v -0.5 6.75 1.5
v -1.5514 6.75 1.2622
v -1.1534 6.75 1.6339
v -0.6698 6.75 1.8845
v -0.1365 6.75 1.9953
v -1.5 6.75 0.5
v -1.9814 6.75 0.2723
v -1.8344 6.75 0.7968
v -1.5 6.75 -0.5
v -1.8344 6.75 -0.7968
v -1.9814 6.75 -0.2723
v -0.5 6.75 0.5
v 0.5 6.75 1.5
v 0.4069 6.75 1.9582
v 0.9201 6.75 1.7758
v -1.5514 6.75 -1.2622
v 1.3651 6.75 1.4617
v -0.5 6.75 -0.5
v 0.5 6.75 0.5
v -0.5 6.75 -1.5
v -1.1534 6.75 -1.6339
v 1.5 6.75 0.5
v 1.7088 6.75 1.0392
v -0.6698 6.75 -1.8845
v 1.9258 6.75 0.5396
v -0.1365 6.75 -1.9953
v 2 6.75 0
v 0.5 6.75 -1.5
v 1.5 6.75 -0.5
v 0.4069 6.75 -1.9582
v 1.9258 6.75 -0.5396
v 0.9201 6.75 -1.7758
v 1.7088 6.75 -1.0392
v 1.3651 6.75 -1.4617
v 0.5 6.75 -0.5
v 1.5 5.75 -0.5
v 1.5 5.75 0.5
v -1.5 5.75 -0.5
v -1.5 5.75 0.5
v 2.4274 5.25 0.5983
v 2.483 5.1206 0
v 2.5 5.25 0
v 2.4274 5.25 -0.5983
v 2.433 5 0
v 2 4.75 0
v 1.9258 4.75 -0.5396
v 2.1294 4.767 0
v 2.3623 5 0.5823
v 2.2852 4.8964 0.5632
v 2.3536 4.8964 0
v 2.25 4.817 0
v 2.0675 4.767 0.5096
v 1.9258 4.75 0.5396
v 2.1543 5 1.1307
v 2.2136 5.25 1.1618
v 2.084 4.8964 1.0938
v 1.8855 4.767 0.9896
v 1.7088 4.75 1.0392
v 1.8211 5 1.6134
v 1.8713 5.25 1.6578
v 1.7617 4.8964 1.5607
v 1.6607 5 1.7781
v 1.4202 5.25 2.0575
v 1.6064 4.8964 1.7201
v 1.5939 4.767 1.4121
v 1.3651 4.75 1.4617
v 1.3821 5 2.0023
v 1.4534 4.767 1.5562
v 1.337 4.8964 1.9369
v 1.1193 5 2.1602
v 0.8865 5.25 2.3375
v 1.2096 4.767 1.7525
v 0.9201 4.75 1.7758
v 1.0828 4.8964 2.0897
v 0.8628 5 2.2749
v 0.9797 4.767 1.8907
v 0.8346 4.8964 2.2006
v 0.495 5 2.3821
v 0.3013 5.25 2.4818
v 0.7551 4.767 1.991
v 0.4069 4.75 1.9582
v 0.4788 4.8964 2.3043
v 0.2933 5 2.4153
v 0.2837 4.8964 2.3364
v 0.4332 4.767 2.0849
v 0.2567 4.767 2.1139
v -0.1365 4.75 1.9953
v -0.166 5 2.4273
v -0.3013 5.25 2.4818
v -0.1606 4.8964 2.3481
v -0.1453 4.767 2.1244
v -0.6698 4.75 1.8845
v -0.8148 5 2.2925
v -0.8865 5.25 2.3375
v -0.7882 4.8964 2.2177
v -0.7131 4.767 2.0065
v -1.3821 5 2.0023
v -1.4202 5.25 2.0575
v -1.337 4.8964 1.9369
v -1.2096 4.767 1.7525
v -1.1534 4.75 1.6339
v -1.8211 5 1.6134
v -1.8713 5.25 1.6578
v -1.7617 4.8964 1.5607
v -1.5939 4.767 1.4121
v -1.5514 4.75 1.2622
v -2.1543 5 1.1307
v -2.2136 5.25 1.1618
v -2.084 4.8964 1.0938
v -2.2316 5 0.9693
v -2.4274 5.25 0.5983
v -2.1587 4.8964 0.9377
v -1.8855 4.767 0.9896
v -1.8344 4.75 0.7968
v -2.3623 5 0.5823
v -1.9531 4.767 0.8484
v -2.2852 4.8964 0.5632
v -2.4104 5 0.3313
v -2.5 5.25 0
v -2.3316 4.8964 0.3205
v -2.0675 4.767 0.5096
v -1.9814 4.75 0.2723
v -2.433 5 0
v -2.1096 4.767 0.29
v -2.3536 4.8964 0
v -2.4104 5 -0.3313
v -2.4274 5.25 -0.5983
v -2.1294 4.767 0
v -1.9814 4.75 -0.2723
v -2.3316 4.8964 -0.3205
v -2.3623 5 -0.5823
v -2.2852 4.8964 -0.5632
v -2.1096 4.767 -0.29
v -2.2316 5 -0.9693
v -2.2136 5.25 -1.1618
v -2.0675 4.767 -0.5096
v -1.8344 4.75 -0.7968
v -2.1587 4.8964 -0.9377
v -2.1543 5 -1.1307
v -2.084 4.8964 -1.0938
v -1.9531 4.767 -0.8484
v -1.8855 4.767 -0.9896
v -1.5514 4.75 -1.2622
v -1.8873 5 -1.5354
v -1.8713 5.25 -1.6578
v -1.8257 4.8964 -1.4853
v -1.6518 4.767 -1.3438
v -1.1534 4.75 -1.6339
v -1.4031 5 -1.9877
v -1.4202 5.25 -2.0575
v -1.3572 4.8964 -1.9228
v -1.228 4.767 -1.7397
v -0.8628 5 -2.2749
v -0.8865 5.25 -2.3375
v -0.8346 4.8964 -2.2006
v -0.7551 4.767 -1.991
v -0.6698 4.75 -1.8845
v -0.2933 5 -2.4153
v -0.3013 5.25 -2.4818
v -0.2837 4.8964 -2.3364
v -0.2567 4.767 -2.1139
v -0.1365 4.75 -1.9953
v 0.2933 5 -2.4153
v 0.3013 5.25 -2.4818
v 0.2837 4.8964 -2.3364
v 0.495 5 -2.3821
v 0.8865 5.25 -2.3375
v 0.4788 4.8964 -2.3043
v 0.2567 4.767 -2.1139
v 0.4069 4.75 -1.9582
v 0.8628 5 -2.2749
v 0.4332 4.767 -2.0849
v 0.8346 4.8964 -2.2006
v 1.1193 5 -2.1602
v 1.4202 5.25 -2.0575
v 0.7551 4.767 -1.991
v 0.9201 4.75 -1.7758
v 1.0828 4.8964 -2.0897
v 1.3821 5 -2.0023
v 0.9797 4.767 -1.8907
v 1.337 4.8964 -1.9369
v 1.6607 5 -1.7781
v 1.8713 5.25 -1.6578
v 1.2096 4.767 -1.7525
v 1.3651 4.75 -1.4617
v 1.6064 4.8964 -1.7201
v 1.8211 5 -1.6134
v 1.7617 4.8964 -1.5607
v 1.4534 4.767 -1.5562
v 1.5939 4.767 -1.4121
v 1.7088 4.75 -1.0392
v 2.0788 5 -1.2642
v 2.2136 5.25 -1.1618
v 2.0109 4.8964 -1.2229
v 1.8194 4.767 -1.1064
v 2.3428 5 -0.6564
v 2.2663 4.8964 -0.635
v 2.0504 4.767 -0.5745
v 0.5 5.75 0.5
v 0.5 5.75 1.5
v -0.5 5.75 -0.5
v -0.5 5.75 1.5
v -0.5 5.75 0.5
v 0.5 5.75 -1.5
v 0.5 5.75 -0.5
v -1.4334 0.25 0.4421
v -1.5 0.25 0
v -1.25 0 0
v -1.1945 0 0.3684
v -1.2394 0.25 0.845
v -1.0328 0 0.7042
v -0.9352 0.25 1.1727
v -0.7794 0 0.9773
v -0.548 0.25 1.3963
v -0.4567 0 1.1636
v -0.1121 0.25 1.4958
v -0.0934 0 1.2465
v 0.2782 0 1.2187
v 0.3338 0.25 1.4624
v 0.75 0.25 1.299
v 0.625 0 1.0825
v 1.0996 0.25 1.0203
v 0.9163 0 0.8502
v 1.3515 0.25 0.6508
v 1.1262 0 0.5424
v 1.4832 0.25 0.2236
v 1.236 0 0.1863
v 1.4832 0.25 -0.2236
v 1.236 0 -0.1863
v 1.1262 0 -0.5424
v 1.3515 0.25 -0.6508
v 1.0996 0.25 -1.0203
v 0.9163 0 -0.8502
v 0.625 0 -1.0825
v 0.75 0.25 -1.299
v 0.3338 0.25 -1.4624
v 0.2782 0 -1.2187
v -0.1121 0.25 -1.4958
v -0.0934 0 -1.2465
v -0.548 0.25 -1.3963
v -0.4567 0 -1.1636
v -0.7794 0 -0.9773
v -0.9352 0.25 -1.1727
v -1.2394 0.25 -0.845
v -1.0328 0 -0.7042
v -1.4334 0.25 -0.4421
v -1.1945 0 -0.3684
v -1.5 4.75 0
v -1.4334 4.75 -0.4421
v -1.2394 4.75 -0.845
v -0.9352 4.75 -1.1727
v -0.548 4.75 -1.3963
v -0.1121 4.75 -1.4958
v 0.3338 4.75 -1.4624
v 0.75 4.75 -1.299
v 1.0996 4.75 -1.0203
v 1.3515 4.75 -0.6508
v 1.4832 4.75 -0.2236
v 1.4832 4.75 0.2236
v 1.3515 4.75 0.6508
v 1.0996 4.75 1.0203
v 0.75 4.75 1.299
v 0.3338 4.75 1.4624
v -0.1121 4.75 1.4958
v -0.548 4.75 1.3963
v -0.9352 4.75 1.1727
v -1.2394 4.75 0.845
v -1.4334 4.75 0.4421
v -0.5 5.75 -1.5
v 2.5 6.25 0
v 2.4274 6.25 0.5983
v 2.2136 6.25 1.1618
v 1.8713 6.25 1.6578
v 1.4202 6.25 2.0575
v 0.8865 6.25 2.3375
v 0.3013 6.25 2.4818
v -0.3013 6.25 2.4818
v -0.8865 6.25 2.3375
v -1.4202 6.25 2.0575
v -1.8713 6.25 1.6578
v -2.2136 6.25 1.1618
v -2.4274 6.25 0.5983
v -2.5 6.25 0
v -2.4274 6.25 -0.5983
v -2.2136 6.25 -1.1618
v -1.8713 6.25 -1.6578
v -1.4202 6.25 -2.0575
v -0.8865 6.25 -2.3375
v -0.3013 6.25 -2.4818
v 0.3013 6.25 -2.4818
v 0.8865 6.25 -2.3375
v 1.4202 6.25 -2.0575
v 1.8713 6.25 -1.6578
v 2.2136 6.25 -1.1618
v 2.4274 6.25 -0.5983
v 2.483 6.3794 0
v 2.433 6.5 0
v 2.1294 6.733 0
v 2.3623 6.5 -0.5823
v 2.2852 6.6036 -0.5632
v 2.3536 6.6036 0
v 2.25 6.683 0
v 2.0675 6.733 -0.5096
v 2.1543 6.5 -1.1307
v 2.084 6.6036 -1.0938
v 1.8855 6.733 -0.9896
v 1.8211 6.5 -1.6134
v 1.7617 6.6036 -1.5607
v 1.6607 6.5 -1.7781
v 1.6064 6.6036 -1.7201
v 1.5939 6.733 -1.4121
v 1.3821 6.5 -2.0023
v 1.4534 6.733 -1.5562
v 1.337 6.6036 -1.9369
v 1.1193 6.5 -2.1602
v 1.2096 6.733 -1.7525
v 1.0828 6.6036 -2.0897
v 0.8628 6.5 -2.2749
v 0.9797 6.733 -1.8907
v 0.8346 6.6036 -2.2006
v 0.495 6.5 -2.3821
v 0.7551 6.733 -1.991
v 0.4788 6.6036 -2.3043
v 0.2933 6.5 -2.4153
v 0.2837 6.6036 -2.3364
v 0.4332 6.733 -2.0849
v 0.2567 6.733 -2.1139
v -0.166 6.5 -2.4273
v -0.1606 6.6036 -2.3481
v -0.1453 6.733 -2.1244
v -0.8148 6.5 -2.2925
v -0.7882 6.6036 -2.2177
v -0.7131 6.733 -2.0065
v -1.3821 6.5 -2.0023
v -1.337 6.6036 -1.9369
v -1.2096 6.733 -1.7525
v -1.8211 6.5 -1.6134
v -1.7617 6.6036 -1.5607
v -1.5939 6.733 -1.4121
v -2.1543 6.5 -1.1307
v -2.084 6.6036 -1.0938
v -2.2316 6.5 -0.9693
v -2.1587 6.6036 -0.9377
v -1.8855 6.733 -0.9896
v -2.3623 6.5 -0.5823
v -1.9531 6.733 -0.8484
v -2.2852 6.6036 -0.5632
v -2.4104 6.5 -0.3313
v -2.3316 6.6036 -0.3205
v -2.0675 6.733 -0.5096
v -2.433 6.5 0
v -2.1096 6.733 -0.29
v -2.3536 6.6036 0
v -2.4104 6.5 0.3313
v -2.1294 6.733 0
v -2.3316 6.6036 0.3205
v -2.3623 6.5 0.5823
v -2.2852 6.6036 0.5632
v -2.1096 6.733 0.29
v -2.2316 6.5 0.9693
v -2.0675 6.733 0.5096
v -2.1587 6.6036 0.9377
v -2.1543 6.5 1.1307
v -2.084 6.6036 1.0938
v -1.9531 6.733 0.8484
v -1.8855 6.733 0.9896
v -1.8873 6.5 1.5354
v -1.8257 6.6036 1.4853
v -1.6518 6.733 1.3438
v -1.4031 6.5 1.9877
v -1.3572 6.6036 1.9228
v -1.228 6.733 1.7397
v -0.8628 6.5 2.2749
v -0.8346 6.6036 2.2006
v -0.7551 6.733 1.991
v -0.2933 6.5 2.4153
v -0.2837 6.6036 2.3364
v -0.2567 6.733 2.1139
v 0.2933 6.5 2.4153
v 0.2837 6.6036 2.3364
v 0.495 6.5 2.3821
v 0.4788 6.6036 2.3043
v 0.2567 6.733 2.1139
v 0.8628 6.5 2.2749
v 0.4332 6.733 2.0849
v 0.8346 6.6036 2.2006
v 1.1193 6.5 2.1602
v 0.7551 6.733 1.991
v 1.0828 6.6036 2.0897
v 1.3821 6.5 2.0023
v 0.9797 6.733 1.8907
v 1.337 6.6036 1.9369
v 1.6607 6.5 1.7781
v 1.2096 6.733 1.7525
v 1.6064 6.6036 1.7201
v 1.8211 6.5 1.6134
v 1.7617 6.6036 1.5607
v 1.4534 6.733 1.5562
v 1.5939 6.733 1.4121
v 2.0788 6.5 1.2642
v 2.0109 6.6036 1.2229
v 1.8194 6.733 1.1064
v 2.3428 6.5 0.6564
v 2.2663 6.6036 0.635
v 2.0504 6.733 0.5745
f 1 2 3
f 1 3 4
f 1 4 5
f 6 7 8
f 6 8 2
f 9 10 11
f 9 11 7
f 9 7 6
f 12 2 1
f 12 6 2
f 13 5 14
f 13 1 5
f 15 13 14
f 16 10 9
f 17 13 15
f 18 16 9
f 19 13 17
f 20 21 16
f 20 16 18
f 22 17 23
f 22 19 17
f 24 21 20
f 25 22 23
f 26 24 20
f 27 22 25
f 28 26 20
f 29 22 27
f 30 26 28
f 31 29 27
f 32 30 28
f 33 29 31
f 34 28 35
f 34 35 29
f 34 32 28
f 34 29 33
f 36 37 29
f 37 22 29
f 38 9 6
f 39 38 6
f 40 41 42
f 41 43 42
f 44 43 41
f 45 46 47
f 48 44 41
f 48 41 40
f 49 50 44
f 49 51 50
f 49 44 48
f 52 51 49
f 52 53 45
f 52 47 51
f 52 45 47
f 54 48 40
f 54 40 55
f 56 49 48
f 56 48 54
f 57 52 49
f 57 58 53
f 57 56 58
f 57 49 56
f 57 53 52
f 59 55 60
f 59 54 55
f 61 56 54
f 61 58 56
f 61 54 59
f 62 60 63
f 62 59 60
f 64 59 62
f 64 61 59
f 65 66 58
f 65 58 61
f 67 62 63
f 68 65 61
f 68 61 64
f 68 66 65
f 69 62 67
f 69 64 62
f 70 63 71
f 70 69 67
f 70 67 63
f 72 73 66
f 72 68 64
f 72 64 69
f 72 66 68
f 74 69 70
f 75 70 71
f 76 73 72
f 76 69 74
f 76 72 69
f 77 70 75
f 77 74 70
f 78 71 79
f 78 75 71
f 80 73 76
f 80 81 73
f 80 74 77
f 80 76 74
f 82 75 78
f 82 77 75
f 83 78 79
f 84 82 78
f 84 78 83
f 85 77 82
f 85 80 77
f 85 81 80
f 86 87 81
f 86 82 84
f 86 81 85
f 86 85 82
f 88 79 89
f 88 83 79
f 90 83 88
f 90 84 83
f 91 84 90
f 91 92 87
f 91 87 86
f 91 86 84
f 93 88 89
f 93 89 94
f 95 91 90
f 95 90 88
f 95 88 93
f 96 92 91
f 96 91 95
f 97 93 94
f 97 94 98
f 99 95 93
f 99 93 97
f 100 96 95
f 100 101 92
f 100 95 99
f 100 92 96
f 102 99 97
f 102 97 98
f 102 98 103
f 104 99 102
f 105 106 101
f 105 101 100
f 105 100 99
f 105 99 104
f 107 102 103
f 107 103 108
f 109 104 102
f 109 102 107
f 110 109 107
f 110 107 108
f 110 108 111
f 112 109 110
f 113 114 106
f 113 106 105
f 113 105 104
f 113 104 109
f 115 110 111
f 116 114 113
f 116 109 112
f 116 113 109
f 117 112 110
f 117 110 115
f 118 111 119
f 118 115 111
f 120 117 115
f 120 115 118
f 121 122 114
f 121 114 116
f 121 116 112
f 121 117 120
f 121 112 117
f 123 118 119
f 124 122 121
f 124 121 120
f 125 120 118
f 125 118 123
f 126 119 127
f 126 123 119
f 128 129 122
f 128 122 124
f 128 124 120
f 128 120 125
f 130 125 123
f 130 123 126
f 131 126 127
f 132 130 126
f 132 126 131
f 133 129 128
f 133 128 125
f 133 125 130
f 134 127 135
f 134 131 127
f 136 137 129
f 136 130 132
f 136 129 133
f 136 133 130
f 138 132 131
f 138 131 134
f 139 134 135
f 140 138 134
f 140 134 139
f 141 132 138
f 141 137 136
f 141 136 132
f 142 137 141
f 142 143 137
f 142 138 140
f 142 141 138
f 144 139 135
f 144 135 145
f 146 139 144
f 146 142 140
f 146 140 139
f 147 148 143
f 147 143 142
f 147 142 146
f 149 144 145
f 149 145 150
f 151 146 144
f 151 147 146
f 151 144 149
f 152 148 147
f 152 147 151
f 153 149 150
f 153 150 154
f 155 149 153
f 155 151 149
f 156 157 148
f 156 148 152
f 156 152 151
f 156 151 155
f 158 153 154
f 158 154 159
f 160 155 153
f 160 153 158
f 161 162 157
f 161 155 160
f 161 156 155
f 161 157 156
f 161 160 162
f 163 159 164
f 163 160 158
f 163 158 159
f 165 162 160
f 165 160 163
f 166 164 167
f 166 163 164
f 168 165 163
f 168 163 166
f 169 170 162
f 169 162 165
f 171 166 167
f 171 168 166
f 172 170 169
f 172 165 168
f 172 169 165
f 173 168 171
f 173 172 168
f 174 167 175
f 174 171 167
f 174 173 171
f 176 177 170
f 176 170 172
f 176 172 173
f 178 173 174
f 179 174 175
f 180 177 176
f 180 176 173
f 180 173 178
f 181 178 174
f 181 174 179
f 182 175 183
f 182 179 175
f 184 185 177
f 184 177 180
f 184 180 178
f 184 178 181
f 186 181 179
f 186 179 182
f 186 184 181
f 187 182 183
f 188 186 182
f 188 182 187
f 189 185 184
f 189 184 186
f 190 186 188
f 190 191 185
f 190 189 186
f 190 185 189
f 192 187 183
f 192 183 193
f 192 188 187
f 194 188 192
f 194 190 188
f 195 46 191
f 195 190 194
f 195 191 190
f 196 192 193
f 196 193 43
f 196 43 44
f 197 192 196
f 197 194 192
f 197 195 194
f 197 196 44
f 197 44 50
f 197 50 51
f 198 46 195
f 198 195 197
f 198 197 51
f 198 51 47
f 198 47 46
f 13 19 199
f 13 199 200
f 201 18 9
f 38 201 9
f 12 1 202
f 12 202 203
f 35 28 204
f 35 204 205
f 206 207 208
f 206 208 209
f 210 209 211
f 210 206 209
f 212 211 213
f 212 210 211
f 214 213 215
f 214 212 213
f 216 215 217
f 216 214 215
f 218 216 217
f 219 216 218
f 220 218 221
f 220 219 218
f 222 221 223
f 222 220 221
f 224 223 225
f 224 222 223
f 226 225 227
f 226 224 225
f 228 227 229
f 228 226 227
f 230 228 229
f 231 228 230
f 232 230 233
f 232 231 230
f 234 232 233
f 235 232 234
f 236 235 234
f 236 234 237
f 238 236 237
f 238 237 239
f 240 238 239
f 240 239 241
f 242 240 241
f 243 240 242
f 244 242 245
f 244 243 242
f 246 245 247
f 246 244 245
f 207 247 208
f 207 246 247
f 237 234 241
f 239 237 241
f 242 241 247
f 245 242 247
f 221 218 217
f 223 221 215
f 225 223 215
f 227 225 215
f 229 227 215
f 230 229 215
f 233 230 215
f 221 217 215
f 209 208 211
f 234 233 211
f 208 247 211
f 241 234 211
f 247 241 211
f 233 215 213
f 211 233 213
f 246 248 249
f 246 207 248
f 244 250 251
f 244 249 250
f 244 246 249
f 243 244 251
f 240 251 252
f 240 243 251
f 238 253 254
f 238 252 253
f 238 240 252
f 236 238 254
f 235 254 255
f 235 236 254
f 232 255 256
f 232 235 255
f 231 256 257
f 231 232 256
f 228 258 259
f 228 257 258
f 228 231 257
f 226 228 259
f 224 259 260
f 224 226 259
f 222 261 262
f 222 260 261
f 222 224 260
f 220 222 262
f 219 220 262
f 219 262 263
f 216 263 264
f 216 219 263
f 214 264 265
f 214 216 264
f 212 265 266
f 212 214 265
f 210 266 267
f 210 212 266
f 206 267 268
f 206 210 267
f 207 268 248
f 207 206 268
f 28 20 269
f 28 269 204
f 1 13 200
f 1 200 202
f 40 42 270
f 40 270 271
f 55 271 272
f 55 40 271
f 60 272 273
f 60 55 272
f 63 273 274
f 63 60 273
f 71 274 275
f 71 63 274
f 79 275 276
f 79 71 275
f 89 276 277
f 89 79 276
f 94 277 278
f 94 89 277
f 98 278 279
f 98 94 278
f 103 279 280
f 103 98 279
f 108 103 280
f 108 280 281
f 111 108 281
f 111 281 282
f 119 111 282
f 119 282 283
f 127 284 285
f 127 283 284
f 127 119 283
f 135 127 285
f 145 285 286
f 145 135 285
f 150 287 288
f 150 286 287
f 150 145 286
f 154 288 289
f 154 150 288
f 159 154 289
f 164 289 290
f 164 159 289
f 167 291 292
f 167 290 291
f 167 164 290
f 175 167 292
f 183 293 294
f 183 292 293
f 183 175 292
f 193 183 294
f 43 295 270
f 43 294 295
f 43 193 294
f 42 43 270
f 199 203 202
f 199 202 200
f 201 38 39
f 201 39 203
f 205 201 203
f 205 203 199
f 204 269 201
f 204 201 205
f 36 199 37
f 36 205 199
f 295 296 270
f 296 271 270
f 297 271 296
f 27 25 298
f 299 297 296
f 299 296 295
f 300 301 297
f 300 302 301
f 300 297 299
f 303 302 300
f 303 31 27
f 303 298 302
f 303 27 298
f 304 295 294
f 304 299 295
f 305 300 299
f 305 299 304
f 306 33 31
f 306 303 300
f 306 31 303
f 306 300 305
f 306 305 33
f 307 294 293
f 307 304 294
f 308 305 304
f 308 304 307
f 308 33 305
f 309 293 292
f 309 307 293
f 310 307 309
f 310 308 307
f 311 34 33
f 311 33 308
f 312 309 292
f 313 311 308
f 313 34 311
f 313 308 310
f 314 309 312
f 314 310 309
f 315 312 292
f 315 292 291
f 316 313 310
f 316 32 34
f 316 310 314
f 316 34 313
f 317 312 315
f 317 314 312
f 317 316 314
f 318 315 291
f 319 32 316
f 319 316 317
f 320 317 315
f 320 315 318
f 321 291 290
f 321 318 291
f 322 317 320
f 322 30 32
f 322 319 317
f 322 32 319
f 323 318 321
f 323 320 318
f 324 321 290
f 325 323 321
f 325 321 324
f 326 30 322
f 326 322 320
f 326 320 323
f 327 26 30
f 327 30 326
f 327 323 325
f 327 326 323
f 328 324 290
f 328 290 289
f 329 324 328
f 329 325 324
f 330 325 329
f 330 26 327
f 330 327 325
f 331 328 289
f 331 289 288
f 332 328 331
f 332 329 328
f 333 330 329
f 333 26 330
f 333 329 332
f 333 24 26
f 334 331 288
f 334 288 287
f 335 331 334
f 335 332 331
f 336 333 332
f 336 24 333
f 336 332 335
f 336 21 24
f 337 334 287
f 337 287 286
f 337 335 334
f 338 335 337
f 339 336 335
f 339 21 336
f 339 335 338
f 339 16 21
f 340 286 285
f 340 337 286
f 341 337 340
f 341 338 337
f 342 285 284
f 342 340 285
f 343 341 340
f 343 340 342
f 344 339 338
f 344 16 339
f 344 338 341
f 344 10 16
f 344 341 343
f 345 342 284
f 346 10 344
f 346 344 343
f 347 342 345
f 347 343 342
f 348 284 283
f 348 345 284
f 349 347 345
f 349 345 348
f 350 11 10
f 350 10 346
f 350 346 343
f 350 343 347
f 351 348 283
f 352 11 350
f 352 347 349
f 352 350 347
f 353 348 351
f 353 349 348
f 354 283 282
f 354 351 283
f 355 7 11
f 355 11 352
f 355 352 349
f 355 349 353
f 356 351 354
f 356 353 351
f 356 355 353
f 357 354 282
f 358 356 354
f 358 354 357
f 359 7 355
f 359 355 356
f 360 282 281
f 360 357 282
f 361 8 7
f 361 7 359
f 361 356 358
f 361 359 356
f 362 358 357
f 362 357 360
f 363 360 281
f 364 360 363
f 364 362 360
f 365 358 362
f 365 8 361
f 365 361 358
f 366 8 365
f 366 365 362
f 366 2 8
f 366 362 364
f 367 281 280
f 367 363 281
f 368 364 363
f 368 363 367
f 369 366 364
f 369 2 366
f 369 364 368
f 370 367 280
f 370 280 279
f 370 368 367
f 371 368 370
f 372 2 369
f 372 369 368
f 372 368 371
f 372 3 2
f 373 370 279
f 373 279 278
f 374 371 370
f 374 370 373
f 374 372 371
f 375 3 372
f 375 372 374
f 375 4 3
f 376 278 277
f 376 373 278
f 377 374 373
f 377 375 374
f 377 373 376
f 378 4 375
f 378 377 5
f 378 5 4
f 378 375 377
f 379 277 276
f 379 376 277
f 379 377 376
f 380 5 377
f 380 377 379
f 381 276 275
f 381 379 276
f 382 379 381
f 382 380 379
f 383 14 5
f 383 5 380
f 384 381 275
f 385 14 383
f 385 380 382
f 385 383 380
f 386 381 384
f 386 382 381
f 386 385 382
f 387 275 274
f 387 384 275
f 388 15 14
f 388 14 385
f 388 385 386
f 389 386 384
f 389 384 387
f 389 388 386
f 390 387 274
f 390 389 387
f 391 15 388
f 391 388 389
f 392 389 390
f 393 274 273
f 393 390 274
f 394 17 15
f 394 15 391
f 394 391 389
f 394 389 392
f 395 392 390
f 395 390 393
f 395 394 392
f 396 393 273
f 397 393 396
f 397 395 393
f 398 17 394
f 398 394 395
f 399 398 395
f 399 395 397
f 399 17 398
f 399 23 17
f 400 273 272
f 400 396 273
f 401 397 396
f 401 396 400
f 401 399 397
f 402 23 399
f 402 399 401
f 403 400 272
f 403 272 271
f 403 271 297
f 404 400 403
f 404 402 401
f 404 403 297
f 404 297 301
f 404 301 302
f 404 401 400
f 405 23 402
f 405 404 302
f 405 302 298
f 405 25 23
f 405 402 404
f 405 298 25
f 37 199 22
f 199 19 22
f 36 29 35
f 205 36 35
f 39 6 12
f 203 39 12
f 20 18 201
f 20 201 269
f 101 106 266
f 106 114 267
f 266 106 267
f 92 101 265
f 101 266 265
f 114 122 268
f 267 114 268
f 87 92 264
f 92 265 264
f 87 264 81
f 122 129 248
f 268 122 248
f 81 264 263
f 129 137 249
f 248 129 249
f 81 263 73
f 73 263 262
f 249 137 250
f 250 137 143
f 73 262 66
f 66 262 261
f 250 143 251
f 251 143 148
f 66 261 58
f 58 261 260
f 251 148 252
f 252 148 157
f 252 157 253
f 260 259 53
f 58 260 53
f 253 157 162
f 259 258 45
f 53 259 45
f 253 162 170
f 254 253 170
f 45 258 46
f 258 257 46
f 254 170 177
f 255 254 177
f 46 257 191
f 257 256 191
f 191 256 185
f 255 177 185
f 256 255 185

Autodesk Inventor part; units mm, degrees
ref_plane "YZ Plane" through (0, 0, 0) normal (1, 0, 0) x (0, 1, 0)
ref_plane "XZ Plane" through (0, 0, 0) normal (0, 1, 0) x (-1, 0, 0)
ref_plane "XY Plane" through (0, 0, 0) normal (0, 0, 1) x (1, 0, 0)
sketch "Sketch1" plane through (0, 0, 0) normal (0, 1, 0) x (-1, 0, 0)
  circle A0 centre (0, 0) radius 1.5
  dimension "d0" = 3
extrude "Extrusion1" add sketch "Sketch1" along normal blind 4.75
sketch "Sketch2" plane through (0, 4.75, 0) normal (0, 1, 0) x (1, 0, 0)
  circle A0 centre (0, 0) radius 2.5
  dimension "d3" = 5
extrude "Extrusion2" add sketch "Sketch2" along normal blind 2
fillet "Fillet1" radius 0.5 2 edges at (-2.5, 6.75, 0) (-2.5, 4.75, 0)
sketch "Sketch3" plane through (0, 6.75, 0) normal (0, 1, 0) x (1, 0, 0)
  line L0 (0.5, -1.5) -> (-0.5, -1.5)
  line L1 (-0.5, -1.5) -> (-0.5, 1.5)
  line L2 (-0.5, 1.5) -> (0.5, 1.5)
  line L3 (0.5, 1.5) -> (0.5, -1.5)
  line L4 (0.5, -1.5) -> (-0.5, 1.5) construction
  line L5 (-0.5, -1.5) -> (0.5, 1.5) construction
  line L6 (-1.5, -0.5) -> (1.5, -0.5)
  line L7 (1.5, -0.5) -> (1.5, 0.5)
  line L8 (1.5, 0.5) -> (-1.5, 0.5)
  line L9 (-1.5, 0.5) -> (-1.5, -0.5)
  line L10 (-1.5, -0.5) -> (1.5, 0.5) construction
  line L11 (1.5, -0.5) -> (-1.5, 0.5) construction
  point P0 (0, 0)
  point P1 (-0.5, -0.5)
  point P2 (0.5, -0.5)
  point P3 (0.5, 0.5)
  point P4 (-0.5, 0.5)
  dimension "d7" = 1
  dimension "d8" = 3
  dimension "d9" = 3
  dimension "d10" = 1
extrude "Extrusion3" cut sketch "Sketch3" against normal blind 1
thread "Thread1" size "M3x0.5" class "6g" standard "ANSI Metric M Profile" full length
chamfer "Chamfer1" distance 0.25 angle 45 1 edges at (1.5, 0, 0)
properties part number "M3_Smaller_Bolt" material "Steel, Alloy"
